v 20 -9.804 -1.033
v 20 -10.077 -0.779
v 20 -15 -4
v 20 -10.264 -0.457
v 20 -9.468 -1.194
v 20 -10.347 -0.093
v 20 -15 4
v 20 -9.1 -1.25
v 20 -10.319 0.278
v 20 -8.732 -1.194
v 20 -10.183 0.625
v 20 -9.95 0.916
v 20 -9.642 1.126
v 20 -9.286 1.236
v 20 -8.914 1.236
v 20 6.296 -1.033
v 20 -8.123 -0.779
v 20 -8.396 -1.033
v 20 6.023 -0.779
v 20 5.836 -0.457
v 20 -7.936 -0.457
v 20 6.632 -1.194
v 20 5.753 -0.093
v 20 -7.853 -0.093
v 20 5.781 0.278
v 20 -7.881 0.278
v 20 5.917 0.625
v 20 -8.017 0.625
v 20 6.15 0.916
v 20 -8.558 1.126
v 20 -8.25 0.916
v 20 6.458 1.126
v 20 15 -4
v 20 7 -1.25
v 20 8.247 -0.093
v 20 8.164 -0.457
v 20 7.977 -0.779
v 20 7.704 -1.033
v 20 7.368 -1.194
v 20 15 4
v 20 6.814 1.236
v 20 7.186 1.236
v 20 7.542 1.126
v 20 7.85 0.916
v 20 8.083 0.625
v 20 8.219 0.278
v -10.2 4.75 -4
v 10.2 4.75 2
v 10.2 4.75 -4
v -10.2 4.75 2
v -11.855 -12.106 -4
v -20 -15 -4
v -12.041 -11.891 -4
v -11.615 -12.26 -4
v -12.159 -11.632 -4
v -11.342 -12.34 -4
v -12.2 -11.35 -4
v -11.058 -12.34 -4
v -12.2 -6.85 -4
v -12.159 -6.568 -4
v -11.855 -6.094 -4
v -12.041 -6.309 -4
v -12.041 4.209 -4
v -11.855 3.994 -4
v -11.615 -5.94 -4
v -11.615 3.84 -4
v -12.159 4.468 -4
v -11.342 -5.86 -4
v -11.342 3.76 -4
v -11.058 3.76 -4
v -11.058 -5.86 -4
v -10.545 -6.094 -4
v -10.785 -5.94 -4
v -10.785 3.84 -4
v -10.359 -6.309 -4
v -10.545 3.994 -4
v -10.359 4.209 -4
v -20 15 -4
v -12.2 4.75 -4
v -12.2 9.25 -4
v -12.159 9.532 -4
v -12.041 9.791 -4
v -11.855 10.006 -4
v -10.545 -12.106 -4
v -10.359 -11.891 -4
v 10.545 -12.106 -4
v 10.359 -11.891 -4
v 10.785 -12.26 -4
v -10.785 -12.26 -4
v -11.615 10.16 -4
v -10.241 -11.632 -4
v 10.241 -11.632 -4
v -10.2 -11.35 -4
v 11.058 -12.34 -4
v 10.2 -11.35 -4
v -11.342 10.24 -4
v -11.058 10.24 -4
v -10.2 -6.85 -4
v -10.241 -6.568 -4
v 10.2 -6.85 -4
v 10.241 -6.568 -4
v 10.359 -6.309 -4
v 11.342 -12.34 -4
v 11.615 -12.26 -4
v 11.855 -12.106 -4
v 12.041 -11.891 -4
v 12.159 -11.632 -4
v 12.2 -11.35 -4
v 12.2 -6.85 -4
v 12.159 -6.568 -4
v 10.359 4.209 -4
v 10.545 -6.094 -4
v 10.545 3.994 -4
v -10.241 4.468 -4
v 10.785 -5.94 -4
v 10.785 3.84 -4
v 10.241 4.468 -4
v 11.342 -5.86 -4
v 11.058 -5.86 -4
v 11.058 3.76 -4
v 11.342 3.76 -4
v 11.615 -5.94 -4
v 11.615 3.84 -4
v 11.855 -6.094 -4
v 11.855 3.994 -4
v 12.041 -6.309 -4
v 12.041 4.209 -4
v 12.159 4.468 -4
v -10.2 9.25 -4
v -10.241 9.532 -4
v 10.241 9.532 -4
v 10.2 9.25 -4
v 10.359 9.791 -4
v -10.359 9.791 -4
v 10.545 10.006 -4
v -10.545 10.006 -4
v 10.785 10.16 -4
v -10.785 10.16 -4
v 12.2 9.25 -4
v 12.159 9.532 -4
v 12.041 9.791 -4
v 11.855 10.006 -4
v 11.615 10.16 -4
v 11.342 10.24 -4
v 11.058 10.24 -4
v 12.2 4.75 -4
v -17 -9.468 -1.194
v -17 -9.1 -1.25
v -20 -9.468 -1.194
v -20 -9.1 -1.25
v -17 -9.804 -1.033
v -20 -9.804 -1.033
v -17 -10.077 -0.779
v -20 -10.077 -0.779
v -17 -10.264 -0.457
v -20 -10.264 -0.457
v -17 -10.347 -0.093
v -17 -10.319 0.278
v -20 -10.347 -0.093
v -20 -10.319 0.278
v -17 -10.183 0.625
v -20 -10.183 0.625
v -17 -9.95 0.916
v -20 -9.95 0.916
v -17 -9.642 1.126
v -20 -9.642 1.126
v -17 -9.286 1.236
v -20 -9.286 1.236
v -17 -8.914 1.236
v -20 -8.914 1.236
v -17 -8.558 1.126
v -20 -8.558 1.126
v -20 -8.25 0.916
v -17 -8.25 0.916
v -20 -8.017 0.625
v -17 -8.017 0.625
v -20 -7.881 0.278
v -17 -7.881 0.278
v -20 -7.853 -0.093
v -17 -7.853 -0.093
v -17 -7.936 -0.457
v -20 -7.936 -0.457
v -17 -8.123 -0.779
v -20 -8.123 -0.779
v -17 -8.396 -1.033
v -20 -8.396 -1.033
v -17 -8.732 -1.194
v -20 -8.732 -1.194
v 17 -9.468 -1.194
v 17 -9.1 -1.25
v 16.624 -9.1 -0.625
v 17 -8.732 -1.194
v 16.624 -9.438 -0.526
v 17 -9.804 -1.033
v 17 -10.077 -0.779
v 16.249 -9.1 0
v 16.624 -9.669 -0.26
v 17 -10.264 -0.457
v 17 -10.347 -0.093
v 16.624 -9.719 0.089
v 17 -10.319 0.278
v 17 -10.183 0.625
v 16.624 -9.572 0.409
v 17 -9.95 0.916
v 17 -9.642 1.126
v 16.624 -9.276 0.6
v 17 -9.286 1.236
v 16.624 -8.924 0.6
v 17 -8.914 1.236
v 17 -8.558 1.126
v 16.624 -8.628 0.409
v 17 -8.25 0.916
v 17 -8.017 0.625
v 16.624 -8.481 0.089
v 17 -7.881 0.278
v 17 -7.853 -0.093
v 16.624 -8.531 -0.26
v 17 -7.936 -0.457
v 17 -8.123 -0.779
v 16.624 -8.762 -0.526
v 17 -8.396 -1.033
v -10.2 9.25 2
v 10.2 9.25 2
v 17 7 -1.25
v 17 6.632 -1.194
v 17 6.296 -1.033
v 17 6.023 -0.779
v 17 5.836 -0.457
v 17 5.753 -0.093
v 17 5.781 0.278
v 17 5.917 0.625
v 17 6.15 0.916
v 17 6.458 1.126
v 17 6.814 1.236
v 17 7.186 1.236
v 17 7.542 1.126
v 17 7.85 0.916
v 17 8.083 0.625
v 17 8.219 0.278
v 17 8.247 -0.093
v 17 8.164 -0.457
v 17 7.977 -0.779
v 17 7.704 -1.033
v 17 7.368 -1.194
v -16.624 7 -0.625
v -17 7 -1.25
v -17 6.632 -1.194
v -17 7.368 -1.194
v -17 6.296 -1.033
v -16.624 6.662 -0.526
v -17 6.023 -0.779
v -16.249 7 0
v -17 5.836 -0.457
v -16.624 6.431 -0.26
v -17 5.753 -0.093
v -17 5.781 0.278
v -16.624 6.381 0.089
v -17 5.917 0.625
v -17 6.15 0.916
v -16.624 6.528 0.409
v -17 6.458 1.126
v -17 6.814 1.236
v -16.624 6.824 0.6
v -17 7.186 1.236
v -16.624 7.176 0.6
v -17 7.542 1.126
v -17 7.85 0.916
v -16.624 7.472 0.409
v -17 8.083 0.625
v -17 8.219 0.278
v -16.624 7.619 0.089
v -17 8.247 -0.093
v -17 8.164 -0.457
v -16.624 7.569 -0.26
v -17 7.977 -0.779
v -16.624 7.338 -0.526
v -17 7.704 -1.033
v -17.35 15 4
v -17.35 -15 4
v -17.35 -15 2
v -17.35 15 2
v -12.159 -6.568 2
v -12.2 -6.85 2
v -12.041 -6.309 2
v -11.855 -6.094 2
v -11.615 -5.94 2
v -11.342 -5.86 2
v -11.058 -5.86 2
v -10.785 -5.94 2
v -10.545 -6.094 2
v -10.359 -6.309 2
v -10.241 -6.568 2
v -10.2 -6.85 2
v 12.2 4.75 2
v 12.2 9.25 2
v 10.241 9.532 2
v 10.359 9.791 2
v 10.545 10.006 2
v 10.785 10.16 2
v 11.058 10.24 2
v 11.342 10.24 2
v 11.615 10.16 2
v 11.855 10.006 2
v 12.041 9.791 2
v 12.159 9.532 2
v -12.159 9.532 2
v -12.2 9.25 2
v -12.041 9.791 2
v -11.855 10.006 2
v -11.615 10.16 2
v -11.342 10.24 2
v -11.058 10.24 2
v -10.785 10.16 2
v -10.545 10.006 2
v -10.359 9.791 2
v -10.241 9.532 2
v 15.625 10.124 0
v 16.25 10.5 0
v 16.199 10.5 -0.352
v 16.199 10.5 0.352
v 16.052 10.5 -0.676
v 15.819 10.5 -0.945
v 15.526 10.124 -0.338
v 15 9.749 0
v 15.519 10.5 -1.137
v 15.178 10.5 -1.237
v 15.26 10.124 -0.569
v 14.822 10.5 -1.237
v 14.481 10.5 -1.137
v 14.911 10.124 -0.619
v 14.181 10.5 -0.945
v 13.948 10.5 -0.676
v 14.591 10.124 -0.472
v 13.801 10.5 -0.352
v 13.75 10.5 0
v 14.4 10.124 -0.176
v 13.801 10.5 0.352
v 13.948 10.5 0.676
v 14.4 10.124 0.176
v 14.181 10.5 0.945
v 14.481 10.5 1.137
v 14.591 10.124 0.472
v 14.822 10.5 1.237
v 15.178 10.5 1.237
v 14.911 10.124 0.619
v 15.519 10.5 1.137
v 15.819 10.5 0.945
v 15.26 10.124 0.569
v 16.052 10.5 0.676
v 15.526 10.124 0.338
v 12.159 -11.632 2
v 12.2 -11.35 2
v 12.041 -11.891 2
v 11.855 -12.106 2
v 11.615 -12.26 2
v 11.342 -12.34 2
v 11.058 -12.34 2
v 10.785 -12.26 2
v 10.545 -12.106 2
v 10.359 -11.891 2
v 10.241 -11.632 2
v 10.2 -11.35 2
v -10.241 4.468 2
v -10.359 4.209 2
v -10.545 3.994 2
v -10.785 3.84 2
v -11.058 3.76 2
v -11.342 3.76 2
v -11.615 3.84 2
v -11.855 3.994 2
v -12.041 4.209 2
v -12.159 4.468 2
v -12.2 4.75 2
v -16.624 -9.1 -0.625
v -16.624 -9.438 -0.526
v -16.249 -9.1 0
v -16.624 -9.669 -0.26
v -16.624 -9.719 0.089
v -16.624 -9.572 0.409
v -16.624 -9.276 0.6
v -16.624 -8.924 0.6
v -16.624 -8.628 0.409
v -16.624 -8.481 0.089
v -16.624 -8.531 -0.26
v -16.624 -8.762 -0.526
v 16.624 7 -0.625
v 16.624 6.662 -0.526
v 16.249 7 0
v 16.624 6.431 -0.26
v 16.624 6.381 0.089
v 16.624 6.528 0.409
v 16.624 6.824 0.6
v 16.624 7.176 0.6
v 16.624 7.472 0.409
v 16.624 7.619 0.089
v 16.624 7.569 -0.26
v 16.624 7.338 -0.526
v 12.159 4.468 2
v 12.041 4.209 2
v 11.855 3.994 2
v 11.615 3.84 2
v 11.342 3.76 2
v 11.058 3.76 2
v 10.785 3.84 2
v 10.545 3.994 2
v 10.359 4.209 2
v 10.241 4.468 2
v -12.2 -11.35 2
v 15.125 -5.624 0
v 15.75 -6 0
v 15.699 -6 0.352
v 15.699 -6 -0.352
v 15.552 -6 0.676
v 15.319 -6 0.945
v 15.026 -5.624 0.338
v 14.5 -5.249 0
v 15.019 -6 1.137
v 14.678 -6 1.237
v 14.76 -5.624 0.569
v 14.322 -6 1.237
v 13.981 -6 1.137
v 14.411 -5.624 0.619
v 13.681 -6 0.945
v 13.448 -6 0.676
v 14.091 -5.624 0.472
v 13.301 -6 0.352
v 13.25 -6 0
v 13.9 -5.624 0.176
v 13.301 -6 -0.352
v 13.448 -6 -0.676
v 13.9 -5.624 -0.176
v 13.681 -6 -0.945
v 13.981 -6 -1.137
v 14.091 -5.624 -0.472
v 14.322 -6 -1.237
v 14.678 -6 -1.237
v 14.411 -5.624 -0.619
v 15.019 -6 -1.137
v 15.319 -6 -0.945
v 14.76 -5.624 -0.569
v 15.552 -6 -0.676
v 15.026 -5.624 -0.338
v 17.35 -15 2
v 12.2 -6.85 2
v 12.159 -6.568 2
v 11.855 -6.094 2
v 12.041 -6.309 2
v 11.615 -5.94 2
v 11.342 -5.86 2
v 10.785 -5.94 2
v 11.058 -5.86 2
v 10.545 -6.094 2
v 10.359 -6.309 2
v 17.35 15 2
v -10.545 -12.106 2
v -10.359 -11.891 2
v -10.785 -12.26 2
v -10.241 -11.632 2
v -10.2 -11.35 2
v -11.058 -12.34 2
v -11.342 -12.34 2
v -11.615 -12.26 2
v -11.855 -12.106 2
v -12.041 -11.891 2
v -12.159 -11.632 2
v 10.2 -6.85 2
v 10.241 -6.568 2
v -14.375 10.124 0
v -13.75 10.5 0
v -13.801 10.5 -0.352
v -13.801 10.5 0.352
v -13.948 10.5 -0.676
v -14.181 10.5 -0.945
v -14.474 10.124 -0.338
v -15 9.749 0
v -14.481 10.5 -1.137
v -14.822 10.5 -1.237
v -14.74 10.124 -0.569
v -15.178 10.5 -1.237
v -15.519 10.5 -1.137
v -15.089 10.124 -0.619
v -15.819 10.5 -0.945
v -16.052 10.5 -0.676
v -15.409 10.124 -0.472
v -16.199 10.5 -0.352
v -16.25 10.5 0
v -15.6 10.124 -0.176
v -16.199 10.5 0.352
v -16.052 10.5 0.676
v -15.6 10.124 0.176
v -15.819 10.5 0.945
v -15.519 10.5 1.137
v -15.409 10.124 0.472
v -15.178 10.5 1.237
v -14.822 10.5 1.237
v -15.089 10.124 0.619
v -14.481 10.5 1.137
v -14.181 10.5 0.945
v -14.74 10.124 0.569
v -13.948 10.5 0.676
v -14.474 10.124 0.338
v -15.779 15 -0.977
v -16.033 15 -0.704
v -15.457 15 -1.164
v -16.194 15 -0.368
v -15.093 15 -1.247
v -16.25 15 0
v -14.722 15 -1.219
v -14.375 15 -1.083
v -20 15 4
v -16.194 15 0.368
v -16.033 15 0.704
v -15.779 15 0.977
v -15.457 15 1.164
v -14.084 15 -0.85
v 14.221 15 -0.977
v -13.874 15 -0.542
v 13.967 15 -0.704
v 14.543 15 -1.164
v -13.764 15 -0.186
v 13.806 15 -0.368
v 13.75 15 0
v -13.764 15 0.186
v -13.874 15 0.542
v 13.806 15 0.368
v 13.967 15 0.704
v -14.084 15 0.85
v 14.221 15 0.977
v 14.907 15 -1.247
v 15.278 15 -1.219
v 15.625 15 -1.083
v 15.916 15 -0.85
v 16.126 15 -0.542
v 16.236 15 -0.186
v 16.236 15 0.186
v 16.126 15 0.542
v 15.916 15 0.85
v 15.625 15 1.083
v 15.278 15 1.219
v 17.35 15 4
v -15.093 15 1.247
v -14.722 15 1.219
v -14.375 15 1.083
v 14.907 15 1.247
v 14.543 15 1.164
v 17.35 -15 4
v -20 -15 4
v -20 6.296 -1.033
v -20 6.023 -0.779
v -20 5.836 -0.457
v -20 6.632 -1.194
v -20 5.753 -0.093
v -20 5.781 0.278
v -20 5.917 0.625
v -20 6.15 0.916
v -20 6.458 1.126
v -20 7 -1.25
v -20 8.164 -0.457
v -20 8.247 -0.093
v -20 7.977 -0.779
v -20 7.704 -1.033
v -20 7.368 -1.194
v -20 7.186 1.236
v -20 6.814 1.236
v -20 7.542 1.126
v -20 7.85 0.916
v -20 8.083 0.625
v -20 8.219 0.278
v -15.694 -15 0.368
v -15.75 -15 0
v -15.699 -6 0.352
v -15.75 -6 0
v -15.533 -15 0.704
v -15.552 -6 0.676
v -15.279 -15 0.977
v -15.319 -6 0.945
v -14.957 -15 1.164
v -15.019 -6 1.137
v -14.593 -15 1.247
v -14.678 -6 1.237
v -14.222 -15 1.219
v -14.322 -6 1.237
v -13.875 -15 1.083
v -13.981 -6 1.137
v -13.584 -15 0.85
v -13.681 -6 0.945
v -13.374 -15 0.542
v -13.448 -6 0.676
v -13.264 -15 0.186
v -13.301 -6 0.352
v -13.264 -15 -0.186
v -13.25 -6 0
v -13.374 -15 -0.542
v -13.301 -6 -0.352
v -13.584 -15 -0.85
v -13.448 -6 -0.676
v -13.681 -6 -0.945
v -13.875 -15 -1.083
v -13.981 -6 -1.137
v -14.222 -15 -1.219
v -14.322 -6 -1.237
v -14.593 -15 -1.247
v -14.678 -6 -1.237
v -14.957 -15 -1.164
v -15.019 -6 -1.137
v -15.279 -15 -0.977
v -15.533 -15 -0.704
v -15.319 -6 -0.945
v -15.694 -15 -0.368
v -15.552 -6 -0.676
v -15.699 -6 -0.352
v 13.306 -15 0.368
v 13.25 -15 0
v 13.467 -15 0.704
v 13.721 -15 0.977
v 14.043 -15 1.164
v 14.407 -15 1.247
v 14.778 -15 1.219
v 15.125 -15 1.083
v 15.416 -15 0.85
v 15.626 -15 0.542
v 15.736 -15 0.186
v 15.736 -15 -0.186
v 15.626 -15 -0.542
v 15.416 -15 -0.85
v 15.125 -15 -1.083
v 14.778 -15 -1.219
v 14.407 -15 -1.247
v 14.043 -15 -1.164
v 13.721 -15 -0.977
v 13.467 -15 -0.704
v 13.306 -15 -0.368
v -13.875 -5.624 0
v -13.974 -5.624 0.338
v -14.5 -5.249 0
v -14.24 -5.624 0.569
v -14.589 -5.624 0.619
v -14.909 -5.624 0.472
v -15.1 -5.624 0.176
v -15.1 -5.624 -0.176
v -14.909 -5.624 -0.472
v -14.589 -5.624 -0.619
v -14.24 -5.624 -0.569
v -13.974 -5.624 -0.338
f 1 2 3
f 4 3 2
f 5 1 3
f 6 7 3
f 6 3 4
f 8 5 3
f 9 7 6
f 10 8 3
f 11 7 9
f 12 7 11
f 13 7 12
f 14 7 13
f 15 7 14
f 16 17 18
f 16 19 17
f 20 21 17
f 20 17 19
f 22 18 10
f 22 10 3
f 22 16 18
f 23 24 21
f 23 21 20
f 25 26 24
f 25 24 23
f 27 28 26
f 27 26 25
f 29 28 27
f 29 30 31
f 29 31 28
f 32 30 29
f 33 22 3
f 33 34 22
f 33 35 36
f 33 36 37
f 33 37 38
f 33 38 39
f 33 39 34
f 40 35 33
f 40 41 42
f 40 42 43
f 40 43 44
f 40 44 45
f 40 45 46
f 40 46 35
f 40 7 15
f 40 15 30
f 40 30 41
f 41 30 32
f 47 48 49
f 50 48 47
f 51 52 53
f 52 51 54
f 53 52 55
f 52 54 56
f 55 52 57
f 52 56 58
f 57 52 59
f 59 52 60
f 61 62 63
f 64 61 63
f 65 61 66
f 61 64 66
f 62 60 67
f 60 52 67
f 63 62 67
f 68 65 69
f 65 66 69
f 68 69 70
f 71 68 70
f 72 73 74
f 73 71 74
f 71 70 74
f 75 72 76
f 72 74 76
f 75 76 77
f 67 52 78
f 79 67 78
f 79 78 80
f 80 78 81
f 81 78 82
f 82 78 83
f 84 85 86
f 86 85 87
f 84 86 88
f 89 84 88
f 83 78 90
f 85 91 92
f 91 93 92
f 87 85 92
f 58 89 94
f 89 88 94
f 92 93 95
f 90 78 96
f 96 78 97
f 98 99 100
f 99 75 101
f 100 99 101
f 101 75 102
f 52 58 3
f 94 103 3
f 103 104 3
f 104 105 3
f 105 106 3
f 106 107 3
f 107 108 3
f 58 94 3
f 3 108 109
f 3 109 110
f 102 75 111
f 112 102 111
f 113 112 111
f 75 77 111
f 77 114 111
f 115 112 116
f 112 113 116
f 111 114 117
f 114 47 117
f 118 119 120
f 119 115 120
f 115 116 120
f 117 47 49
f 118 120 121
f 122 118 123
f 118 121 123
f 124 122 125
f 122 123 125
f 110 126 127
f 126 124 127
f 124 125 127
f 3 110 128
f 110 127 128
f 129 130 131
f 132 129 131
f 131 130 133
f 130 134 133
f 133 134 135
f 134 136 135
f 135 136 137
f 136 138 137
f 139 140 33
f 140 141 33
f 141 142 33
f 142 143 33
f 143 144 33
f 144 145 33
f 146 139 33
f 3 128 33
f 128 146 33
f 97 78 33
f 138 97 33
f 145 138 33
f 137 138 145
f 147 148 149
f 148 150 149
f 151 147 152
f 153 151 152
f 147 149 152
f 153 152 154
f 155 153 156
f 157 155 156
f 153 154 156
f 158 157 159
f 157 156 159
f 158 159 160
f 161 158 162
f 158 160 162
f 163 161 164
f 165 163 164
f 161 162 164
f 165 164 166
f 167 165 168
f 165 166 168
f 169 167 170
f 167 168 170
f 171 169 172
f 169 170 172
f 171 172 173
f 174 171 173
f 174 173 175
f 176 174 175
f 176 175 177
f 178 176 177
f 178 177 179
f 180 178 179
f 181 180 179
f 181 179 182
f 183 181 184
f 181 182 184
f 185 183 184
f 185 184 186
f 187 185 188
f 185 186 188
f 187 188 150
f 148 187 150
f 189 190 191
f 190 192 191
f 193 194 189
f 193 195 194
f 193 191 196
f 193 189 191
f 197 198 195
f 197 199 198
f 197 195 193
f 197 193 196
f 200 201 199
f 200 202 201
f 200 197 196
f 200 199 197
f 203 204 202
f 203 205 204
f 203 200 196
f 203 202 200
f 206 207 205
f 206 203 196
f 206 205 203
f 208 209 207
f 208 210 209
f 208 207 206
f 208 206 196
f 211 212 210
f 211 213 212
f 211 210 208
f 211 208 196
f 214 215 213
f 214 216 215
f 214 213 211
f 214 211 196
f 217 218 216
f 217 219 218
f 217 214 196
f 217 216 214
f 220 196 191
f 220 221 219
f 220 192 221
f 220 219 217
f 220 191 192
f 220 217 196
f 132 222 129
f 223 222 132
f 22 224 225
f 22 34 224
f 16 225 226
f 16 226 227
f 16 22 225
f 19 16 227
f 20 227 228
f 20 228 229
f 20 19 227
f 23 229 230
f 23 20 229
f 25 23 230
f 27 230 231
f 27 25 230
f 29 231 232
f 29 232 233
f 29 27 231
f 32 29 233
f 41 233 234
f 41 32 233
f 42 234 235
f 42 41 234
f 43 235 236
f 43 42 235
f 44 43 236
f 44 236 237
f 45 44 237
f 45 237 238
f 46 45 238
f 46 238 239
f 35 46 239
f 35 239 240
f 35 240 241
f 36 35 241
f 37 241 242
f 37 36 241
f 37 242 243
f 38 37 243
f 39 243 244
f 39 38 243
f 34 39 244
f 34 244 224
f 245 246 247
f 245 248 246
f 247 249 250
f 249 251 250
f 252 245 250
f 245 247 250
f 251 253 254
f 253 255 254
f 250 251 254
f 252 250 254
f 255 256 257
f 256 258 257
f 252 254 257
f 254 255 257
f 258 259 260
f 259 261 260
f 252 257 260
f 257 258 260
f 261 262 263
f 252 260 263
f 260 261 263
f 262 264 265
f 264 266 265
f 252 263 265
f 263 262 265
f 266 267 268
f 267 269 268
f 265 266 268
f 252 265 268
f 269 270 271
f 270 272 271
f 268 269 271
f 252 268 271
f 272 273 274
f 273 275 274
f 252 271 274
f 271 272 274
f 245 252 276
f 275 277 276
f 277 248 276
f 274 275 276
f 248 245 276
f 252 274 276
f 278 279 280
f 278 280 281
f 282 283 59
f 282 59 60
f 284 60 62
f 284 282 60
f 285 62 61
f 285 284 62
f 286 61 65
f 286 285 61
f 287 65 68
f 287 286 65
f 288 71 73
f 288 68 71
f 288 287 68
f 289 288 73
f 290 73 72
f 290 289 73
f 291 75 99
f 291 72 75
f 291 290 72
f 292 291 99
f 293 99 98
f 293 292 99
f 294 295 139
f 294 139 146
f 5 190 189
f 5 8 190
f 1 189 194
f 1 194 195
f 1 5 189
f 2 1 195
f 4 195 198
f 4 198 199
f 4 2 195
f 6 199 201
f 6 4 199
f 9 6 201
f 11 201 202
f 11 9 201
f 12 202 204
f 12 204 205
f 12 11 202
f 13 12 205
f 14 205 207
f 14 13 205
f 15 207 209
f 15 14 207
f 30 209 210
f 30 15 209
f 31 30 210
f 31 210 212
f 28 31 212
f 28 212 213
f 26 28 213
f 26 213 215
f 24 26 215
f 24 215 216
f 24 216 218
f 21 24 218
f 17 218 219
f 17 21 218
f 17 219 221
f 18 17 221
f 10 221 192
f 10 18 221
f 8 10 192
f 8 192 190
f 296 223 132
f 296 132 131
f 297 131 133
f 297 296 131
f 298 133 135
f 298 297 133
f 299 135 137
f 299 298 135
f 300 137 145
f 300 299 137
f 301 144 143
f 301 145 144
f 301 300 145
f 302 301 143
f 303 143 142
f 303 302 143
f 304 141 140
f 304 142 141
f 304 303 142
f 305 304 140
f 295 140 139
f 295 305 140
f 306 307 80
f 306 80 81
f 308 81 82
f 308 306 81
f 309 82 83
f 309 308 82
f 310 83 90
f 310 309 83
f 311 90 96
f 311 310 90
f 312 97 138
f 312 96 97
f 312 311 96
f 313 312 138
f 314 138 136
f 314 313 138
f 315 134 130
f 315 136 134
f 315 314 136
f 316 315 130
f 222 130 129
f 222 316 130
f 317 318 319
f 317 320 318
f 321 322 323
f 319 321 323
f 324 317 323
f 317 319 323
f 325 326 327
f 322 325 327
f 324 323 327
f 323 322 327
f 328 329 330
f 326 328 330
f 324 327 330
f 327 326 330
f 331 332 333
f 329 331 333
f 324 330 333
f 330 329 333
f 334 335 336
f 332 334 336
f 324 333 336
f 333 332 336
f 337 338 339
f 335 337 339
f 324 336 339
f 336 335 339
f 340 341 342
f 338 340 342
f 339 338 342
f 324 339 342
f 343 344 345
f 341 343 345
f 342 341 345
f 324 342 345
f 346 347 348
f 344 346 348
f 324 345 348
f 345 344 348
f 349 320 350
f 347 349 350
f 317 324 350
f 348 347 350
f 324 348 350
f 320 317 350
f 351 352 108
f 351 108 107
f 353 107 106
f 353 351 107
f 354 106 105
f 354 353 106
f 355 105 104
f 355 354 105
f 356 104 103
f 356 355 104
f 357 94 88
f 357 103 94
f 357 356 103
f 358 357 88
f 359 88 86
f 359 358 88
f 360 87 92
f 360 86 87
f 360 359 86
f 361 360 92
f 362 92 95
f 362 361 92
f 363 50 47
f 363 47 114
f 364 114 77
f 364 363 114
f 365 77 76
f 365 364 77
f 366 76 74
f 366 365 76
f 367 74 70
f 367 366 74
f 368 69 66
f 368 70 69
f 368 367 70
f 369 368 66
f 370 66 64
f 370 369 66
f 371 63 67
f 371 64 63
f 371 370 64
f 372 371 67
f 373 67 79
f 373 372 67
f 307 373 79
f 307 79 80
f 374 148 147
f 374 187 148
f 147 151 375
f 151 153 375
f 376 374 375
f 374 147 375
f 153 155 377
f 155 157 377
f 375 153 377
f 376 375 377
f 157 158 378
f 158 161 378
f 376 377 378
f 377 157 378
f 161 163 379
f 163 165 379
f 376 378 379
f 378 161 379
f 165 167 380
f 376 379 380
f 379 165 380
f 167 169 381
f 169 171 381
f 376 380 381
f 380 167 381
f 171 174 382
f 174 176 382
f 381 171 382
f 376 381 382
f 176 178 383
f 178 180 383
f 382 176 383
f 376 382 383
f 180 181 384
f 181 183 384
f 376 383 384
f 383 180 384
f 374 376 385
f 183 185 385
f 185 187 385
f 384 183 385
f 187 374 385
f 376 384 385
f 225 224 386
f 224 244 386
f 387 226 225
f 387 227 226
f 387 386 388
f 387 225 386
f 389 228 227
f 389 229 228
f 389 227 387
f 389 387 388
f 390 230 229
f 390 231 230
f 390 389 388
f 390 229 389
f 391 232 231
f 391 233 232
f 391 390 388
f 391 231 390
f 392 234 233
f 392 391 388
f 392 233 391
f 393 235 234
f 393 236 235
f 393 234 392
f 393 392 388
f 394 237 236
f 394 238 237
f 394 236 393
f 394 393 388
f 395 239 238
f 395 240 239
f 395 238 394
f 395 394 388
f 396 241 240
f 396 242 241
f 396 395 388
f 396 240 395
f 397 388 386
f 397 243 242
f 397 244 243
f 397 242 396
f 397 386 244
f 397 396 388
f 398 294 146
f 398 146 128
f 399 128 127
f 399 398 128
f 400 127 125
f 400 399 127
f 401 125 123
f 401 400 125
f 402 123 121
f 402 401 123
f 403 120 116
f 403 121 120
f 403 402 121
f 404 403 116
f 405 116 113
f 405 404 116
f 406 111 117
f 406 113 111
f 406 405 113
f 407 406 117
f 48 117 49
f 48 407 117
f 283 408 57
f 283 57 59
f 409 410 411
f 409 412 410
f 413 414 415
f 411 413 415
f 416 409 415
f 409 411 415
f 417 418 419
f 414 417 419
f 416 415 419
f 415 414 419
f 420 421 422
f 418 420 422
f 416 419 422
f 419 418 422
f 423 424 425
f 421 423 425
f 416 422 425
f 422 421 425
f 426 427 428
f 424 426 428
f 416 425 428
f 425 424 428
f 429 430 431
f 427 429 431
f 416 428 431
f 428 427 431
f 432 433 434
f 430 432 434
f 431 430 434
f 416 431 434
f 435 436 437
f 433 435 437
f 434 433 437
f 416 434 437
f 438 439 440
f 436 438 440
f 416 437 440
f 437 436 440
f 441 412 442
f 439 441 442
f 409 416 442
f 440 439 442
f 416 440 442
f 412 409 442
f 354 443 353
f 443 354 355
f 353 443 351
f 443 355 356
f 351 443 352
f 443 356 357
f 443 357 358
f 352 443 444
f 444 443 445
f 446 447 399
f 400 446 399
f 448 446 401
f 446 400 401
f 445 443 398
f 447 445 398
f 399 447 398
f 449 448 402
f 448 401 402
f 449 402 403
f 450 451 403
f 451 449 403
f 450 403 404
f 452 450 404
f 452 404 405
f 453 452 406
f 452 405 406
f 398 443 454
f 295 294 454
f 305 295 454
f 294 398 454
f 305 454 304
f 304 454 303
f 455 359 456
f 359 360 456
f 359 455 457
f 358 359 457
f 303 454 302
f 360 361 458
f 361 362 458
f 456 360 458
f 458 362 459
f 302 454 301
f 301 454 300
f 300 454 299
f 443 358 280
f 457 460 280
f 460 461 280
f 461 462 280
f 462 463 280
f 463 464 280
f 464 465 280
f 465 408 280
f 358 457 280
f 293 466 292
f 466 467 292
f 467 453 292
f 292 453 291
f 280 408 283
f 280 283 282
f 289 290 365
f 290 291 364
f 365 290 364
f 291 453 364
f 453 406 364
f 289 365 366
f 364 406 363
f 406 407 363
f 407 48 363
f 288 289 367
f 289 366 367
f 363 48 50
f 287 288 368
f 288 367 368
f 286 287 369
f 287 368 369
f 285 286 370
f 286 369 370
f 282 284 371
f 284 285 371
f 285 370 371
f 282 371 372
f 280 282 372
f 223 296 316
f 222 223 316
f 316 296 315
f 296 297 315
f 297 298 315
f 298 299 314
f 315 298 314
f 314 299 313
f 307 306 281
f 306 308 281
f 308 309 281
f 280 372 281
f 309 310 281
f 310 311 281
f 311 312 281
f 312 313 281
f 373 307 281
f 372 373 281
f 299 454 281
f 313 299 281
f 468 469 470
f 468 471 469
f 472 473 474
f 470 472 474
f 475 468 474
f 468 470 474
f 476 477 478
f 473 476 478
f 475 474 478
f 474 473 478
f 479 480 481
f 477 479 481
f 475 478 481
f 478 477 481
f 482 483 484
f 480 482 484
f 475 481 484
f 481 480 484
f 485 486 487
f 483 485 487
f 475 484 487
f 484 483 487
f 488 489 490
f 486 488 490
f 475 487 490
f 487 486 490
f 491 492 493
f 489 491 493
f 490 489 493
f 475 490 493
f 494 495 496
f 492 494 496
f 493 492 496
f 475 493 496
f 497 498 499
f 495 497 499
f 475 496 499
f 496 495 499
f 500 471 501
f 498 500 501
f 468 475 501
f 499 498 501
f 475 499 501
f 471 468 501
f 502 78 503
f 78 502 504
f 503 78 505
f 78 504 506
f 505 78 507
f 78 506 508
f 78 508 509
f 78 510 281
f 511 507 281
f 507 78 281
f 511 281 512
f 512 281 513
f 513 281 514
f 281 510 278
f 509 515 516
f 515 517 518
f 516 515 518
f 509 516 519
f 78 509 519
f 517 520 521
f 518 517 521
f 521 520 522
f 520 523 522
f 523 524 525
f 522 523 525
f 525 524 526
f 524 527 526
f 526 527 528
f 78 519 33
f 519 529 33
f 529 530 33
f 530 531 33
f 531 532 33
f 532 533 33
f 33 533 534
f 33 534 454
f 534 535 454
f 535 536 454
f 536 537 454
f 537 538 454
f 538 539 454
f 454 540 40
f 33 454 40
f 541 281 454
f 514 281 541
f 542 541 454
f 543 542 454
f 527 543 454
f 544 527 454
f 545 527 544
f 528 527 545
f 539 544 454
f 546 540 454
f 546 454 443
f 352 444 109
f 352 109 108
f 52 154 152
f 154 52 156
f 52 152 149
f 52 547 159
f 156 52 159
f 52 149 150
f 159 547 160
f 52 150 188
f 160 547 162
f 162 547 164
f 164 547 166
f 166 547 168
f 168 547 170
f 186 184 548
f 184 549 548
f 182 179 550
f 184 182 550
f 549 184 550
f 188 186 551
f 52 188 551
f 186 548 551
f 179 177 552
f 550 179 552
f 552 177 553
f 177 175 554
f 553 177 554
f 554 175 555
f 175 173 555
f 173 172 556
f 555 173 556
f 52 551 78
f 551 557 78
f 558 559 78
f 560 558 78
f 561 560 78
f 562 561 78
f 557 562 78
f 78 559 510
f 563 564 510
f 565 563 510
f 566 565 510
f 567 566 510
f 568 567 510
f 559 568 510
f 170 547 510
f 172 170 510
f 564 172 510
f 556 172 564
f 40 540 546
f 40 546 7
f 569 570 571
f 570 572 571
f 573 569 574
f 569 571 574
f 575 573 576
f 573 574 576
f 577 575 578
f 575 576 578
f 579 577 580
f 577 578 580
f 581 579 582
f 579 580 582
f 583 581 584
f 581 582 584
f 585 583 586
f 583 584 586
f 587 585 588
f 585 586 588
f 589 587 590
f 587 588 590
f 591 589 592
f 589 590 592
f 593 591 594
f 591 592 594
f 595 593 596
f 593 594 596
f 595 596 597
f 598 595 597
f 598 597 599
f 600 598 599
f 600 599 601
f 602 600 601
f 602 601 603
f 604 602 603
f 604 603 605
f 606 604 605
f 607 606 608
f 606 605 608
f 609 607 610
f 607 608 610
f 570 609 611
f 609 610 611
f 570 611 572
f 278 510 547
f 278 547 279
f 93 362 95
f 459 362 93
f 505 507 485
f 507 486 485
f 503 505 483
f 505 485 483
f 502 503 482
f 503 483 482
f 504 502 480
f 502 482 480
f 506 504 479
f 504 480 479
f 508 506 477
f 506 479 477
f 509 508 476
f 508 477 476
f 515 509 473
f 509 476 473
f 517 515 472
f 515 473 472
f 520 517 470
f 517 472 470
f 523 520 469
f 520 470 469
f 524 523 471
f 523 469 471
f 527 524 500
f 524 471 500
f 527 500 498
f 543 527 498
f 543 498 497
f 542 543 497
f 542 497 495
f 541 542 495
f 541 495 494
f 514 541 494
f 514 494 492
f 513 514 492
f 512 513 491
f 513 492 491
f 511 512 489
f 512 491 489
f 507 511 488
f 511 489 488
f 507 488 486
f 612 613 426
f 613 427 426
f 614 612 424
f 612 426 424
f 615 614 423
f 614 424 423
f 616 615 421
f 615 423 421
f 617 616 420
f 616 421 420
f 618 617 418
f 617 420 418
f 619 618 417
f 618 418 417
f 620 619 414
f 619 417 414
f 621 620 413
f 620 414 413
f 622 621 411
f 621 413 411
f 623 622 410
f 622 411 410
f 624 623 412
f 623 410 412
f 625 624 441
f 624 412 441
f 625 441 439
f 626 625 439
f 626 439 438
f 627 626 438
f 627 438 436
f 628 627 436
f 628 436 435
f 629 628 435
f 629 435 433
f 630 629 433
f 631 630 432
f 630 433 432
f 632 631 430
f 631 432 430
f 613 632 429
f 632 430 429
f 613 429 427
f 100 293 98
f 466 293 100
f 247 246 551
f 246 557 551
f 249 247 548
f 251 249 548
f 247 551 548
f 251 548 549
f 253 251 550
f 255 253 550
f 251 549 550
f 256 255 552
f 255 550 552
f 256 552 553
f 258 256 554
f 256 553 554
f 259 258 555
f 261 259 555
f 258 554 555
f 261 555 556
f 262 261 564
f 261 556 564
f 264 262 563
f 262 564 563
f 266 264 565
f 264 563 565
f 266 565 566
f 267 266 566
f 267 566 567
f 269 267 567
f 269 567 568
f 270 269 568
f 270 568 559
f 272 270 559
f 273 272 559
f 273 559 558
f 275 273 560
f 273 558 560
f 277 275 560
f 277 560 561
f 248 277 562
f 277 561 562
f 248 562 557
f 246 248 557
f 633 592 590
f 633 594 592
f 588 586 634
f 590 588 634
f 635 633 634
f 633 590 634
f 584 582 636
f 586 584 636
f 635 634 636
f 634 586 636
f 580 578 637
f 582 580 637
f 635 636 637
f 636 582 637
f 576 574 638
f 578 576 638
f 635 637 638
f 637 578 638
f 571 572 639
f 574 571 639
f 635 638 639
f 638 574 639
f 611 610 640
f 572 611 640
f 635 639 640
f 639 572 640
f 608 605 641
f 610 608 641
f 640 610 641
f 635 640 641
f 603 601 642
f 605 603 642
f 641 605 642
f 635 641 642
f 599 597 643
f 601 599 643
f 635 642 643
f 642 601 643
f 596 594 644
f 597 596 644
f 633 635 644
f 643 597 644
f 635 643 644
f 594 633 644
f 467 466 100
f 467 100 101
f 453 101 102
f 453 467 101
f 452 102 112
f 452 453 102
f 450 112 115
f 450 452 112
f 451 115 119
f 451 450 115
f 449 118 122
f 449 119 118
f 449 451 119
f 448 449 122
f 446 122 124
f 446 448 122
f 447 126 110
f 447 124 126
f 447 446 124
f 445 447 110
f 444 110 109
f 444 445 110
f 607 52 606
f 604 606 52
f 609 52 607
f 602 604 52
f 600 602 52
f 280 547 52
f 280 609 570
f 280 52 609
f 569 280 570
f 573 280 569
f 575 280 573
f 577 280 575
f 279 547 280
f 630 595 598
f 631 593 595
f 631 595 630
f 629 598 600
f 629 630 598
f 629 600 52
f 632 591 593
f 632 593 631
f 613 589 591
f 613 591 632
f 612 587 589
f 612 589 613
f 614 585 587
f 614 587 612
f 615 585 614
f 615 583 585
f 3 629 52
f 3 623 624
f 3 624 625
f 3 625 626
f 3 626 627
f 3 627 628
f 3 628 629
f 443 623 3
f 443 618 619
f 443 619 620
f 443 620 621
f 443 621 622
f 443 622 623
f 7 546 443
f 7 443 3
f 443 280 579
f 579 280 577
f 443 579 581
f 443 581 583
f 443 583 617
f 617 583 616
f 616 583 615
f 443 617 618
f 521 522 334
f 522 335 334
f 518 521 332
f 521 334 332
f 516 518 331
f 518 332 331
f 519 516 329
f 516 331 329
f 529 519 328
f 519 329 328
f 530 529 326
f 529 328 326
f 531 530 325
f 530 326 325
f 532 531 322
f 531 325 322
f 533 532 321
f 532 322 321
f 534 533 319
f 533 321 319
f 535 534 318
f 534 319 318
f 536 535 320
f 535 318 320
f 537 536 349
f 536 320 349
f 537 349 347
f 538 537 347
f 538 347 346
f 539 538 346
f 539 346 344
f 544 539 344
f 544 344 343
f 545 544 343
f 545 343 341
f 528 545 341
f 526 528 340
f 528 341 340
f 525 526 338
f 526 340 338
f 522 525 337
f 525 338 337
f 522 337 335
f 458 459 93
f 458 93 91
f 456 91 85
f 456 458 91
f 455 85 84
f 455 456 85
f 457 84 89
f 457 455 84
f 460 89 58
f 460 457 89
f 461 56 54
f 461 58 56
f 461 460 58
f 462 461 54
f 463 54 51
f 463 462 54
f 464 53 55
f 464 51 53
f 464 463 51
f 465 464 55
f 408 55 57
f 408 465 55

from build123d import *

# Parameters (mm, degrees)
SKETCH1_W                   = 40
SKETCH1_H                   = 30
BOSS_EXTRUDE1_DEPTH         = 4
CUT_EXTRUDE1_DEPTH          = 2
CUT_EXTRUDE2_DEPTH          = 26.709920264
M3_TAPPED_HOLE1_D           = 2.5
M3_TAPPED_HOLE1_DEPTH       = 9
M3_TAPPED_HOLE1_TIP         = 0.751075774
M3_TAPPED_HOLE2_AT_2_COUNT  = 2
M3_TAPPED_HOLE2_AT_2_PITCH  = 16.1
TAP_DRILL_FOR_M3_TAP1_D     = 2.5
TAP_DRILL_FOR_M3_TAP1_DEPTH = 4.5
TAP_DRILL_FOR_M3_TAP1_TIP   = 0.751075774


with BuildPart() as part:
    # Sketch1 → Boss-Extrude1 (new, symmetric)
    with BuildSketch(Plane.XY):
        Rectangle(SKETCH1_W, SKETCH1_H)
    extrude(amount=BOSS_EXTRUDE1_DEPTH, both=True)

    # Sketch2 → Cut-Extrude1 (cut)
    with BuildSketch(Plane.XY.offset(4)):
        with BuildLine():
            Line((-15.85, 21.25), (15.85, 21.25))
            ThreePointArc((15.85, 21.25), (16.910660172, 20.810660172), (17.35, 19.75))
            Line((17.35, 19.75), (17.35, -13.2))
            Line((17.35, -13.2), (17.35, -15))
            Line((17.35, -15), (-17.35, -15))
            Line((-17.35, -15), (-17.35, -13.2))
            Line((-17.35, -13.2), (-17.35, 19.75))
            ThreePointArc((-17.35, 19.75), (-16.910660172, 20.810660172), (-15.85, 21.25))
        make_face()
    extrude(amount=-CUT_EXTRUDE1_DEPTH, mode=Mode.SUBTRACT)

    # Sketch3 → Cut-Extrude2 (cut, through all)
    with BuildSketch(Plane.XY.offset(2)):
        with BuildLine():
            Line((12.2, 9.25), (12.2, 4.75))
            ThreePointArc((12.2, 4.75), (11.2, 3.75), (10.2, 4.75))
            Line((10.2, 4.75), (-10.2, 4.75))
            ThreePointArc((-10.2, 4.75), (-11.2, 3.75), (-12.2, 4.75))
            Line((-12.2, 4.75), (-12.2, 9.25))
            ThreePointArc((-12.2, 9.25), (-11.2, 10.25), (-10.2, 9.25))
            Line((-10.2, 9.25), (10.2, 9.25))
            ThreePointArc((10.2, 9.25), (11.2, 10.25), (12.2, 9.25))
        make_face()
        with BuildLine():
            Line((-10.2, -6.85), (10.2, -6.85))
            ThreePointArc((10.2, -6.85), (11.2, -5.85), (12.2, -6.85))
            Line((12.2, -6.85), (12.2, -11.35))
            ThreePointArc((12.2, -11.35), (11.2, -12.35), (10.2, -11.35))
            Line((10.2, -11.35), (-10.2, -11.35))
            ThreePointArc((-10.2, -11.35), (-11.2, -12.35), (-12.2, -11.35))
            Line((-12.2, -11.35), (-12.2, -6.85))
            ThreePointArc((-12.2, -6.85), (-11.2, -5.85), (-10.2, -6.85))
        make_face()
    extrude(amount=-CUT_EXTRUDE2_DEPTH, mode=Mode.SUBTRACT)

    # M3 Tapped Hole1
    with Locations(Plane(origin=(-0.662160093, -15, 0.523062075), x_dir=(1, 0, 0), z_dir=(0, -1, 0))):
        with Locations((15.162160093, -0.523062075), (-13.837839907, -0.523062075)):
            Hole(M3_TAPPED_HOLE1_D / 2, depth=M3_TAPPED_HOLE1_DEPTH)
            with Locations((0, 0, -(M3_TAPPED_HOLE1_DEPTH + M3_TAPPED_HOLE1_TIP / 2))):  # 118° drill point
                Cone(0, M3_TAPPED_HOLE1_D / 2, M3_TAPPED_HOLE1_TIP, mode=Mode.SUBTRACT)

    # Sketch16 → M3 Tapped Hole2 (revolve, cut)
    with BuildSketch(Plane(origin=(20, 7, 0), x_dir=(0, 0, -1), z_dir=(0, 1, 0))):
        Polygon((0, 0), (0, 3.751075774), (1.25, 3), (1.25, 0), align=None)
    m3_tapped_hole2 = revolve(axis=Axis((26.35, 7, 0), (-1, 0, 0)), mode=Mode.SUBTRACT)

    # M3 Tapped Hole2 at 2: M3 Tapped Hole2 ×2
    with Locations(*[(0, -i * M3_TAPPED_HOLE2_AT_2_PITCH, 0) for i in range(1, M3_TAPPED_HOLE2_AT_2_COUNT)]):
        add(m3_tapped_hole2, mode=Mode.SUBTRACT)

    # Mirror1: M3 Tapped Hole2 across plane
    add(m3_tapped_hole2.mirror(Plane(origin=(0, 0, 0), x_dir=(0, 0, 1), z_dir=(1, 0, 0))), mode=Mode.SUBTRACT)

    # Mirror1 copy 1 sketch → Mirror1 copy 1 (revolve, cut)
    with BuildSketch(Plane(origin=(-20, -9.1, 0), x_dir=(0, 0, -1), z_dir=(0, 1, 0))):
        Polygon((0, 0), (0, -3.751075774), (1.25, -3), (1.25, 0), align=None)
    revolve(axis=Axis((-26.35, -9.1, 0), (-1, 0, 0)), mode=Mode.SUBTRACT)

    # Tap Drill for M3 Tap1
    with Locations(Plane(origin=(0, 15, 0), x_dir=(1, 0, 0), z_dir=(0, 1, 0))):
        with Locations((-15, 0), (15, 0)):
            Hole(TAP_DRILL_FOR_M3_TAP1_D / 2, depth=TAP_DRILL_FOR_M3_TAP1_DEPTH)
            with Locations((0, 0, -(TAP_DRILL_FOR_M3_TAP1_DEPTH + TAP_DRILL_FOR_M3_TAP1_TIP / 2))):  # 118° drill point
                Cone(0, TAP_DRILL_FOR_M3_TAP1_D / 2, TAP_DRILL_FOR_M3_TAP1_TIP, mode=Mode.SUBTRACT)


solid = part.part
